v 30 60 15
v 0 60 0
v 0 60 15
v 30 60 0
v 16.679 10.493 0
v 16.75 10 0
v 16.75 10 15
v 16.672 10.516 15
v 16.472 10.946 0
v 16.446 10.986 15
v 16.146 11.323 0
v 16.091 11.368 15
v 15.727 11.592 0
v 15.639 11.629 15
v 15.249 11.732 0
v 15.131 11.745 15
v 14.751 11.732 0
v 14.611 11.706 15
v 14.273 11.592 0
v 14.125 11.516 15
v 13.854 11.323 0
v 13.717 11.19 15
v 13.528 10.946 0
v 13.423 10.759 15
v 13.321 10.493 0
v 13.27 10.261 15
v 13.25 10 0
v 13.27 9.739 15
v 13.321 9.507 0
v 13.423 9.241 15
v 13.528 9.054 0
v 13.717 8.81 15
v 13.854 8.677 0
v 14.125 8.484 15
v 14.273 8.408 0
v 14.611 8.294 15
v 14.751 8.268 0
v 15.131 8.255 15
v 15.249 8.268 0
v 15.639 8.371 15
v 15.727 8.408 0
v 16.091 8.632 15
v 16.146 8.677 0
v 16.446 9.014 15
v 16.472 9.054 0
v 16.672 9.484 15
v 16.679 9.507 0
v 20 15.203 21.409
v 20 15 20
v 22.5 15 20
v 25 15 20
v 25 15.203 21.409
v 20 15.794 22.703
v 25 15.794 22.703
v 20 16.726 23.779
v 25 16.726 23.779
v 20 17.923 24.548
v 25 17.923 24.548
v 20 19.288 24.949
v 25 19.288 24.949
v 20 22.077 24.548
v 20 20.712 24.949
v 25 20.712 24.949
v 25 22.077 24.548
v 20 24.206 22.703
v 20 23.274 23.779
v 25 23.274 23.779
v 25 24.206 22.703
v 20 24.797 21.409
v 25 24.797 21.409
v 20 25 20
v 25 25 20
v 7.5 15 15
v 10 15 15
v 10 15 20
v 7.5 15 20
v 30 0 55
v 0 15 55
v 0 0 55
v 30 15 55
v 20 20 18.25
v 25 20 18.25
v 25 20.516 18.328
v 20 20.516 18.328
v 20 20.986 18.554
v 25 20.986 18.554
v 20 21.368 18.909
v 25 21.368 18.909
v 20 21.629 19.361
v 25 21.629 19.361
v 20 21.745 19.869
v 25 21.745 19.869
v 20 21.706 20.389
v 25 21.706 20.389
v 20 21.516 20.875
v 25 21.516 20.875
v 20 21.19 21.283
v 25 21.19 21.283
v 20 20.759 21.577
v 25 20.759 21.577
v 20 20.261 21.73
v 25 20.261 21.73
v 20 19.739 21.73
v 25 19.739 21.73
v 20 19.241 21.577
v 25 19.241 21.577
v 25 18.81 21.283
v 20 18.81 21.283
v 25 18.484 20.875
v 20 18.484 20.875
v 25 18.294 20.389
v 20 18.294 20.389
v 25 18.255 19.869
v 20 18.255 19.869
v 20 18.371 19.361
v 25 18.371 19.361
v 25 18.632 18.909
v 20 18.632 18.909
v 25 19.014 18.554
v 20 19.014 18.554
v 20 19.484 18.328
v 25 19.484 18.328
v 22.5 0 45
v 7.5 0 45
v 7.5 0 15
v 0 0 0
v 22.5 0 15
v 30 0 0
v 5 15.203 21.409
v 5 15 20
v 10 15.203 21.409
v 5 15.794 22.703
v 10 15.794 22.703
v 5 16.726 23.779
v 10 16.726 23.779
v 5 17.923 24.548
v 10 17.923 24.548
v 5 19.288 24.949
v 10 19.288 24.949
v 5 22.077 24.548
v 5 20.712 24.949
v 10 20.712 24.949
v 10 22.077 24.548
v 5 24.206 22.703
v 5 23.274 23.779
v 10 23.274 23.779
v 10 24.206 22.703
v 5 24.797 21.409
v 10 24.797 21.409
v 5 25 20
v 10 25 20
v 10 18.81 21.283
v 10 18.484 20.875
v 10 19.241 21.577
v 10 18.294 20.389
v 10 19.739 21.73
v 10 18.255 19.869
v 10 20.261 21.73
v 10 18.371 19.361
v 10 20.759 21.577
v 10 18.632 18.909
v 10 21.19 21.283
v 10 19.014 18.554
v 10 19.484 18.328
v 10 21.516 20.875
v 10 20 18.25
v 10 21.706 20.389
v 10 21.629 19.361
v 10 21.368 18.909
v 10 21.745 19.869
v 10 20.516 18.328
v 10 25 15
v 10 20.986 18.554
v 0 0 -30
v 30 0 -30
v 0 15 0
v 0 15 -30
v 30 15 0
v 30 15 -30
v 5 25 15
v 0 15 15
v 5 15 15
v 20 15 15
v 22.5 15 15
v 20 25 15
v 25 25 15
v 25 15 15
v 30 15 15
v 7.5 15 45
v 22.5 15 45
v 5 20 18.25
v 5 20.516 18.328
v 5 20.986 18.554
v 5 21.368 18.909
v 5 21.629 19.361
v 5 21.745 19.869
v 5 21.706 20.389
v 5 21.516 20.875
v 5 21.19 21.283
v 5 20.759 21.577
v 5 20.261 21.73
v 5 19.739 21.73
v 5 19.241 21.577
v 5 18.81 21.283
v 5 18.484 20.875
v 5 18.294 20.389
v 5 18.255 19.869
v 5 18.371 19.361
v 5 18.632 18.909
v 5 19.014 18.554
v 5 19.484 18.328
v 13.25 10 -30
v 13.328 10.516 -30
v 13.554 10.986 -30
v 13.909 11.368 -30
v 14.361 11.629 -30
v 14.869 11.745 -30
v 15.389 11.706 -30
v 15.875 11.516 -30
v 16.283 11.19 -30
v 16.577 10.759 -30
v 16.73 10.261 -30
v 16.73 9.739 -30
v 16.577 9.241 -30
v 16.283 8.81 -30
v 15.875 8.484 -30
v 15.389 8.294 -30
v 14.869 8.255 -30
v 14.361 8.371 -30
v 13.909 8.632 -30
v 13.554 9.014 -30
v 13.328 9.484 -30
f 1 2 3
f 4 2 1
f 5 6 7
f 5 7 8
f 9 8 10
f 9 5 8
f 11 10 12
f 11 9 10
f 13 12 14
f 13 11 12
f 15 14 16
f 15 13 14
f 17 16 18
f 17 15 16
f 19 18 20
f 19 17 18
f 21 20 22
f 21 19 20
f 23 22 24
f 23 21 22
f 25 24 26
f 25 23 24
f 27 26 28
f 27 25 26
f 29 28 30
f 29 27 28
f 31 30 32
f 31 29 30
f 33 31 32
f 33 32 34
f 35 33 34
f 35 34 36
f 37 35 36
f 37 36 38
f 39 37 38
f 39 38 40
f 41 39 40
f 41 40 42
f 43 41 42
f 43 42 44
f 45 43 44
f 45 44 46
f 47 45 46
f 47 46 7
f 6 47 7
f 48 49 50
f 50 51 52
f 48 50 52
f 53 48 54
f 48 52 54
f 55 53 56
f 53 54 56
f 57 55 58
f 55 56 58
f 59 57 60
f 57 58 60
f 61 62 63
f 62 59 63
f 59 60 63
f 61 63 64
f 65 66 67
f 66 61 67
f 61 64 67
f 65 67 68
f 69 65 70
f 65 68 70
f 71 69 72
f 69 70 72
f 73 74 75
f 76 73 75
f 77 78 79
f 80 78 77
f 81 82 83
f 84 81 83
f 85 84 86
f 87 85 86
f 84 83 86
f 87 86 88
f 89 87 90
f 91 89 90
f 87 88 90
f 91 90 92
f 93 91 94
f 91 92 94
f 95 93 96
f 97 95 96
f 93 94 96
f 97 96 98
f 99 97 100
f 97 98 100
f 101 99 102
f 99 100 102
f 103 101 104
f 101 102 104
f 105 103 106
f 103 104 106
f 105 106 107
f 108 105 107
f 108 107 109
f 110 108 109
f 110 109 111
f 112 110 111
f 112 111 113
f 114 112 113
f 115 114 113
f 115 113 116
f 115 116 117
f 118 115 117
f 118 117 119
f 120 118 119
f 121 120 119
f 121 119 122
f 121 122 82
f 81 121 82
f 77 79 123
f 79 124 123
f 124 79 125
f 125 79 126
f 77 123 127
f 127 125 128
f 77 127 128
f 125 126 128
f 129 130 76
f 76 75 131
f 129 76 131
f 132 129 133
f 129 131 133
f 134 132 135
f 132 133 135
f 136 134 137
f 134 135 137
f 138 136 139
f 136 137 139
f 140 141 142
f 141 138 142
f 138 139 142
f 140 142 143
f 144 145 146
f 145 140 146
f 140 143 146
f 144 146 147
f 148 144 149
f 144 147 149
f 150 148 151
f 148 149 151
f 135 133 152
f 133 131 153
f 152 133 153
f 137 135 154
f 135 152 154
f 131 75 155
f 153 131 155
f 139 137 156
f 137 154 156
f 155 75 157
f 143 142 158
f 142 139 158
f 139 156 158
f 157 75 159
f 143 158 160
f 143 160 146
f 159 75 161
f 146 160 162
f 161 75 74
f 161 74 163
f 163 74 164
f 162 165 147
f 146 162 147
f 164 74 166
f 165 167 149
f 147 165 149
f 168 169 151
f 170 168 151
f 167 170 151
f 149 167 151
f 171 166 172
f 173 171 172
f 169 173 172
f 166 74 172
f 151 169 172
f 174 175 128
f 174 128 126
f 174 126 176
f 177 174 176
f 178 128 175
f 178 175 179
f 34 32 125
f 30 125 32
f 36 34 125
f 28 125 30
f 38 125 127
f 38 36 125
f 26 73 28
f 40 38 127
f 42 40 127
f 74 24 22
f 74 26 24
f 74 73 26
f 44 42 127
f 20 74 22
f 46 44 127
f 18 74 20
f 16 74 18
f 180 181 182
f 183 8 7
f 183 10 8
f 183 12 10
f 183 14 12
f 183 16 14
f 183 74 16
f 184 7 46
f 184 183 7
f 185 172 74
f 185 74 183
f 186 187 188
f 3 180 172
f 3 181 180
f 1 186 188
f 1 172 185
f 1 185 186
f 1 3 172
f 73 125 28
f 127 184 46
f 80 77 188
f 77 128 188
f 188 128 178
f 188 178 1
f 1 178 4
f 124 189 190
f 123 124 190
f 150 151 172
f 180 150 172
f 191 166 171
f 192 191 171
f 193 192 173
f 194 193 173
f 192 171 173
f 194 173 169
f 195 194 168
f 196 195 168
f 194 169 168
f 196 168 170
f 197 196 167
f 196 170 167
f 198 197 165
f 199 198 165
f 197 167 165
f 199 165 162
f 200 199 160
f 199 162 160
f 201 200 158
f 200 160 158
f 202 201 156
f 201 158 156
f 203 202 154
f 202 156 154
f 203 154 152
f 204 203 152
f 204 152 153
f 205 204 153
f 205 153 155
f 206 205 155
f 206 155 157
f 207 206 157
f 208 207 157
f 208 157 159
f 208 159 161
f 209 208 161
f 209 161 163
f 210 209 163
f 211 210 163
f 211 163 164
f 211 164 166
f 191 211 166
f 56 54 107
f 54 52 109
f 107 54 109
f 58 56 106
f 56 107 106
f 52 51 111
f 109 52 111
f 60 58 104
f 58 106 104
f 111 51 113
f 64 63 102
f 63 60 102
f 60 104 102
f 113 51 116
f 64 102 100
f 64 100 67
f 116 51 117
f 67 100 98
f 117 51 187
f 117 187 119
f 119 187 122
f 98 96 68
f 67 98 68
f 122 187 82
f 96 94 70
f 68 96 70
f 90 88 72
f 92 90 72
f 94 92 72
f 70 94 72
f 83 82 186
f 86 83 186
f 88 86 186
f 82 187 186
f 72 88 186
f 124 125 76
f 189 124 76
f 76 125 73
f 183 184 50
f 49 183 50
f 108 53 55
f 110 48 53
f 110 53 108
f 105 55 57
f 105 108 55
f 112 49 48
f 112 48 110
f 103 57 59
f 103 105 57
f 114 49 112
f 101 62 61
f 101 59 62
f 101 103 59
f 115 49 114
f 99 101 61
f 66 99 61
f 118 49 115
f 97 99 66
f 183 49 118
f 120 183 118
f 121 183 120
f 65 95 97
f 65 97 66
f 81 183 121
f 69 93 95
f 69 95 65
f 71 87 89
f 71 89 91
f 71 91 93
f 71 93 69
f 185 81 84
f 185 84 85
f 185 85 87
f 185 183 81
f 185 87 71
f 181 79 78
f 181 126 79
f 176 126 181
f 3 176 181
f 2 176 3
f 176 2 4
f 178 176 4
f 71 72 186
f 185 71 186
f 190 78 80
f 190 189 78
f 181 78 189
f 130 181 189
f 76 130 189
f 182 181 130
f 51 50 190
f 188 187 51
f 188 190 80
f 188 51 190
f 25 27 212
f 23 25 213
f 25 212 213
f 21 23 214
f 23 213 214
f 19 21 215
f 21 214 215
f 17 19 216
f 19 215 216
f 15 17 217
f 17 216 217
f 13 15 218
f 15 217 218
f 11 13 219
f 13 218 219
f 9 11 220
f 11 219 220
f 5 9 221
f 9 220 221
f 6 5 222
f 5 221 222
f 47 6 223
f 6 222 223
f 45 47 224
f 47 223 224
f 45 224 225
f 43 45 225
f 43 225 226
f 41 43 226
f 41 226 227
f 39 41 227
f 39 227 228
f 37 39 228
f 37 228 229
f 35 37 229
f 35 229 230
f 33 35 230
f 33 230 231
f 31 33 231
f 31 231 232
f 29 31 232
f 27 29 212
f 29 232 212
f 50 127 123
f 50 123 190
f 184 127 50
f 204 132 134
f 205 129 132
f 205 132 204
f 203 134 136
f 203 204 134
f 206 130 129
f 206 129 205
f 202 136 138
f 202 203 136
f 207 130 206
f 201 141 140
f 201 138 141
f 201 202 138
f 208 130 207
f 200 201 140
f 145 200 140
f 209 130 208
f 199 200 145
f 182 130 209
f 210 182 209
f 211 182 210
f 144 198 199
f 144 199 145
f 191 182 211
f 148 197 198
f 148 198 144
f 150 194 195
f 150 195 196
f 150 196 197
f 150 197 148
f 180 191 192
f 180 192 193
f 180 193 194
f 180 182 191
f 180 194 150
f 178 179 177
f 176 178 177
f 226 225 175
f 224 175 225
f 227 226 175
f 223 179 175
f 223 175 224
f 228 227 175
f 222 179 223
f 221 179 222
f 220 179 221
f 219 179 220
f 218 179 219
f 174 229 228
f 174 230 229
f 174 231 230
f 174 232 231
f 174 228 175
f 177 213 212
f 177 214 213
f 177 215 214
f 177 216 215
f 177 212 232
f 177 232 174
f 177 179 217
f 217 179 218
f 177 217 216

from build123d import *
from build123d.topology import SkipClean

# Parameters (mm, degrees)
SKETCH1_W           = 30
SKETCH1_H           = 60
SKETCH1_R           = 1.75
BOSS_EXTRUDE1_DEPTH = 15
SKETCH4_R           = 1.75
BOSS_EXTRUDE3_DEPTH = 30
SKETCH5_W           = 5
SKETCH5_H           = 10
SKETCH5_W_2         = 10
CUT_EXTRUDE1_DEPTH  = 69.738635424
SKETCH6_W           = 7.5
SKETCH6_H           = 15
BOSS_EXTRUDE4_DEPTH = 30
SKETCH7_W           = 30
SKETCH7_H           = 15
BOSS_EXTRUDE5_DEPTH = 10
BOSS_EXTRUDE6_START = 30
SKETCH8_W           = 30
SKETCH8_H           = 15
SKETCH8_R           = 1.75
BOSS_EXTRUDE6_DEPTH = 30


with BuildPart() as part:
    # Sketch1 → Boss-Extrude1 (new body)
    with BuildSketch(Plane.XY):
        with Locations((15, 30)):
            Rectangle(SKETCH1_W, SKETCH1_H)
        with Locations((15, 10)):
            Circle(SKETCH1_R, mode=Mode.SUBTRACT)
    extrude(amount=BOSS_EXTRUDE1_DEPTH)

    # Sketch4 → Boss-Extrude3 (add)
    with BuildSketch(Plane(origin=(30, 0, 0), x_dir=(0, 0, -1), z_dir=(1, 0, 0))):
        with BuildLine():
            Line((-15, 15), (-20, 15))
            ThreePointArc((-20, 15), (-25, 20), (-20, 25))
            Line((-20, 25), (-15, 25))
            Line((-15, 25), (-15, 15))
        make_face()
        with Locations((-20, 20)):
            Circle(SKETCH4_R, mode=Mode.SUBTRACT)
    extrude(amount=-BOSS_EXTRUDE3_DEPTH)

    # Sketch5 → Cut-Extrude1 (cut, through all)
    with BuildSketch(Plane.XY.offset(15)):
        with Locations((2.5, 20)):
            Rectangle(SKETCH5_W, SKETCH5_H)
        with Locations((15, 20)):
            Rectangle(SKETCH5_W_2, SKETCH5_H)
        with Locations((27.5, 20)):
            Rectangle(SKETCH5_W, SKETCH5_H)
    extrude(amount=CUT_EXTRUDE1_DEPTH, mode=Mode.SUBTRACT)

    # Sketch6 → Boss-Extrude4 (add)
    with BuildSketch(Plane.XY.offset(15)):
        with Locations((3.75, 7.5)):
            Rectangle(SKETCH6_W, SKETCH6_H)
        with Locations((26.25, 7.5)):
            Rectangle(SKETCH6_W, SKETCH6_H)
    extrude(amount=BOSS_EXTRUDE4_DEPTH)

    # Sketch7 → Boss-Extrude5 (add)
    with BuildSketch(Plane.XY.offset(45)):
        with Locations((15, 7.5)):
            Rectangle(SKETCH7_W, SKETCH7_H)
    extrude(amount=BOSS_EXTRUDE5_DEPTH)

    # Sketch8 → Boss-Extrude6 (add)
    with SkipClean():  # the faces are left unmerged after this step: merging them gives an invalid solid
        with BuildSketch(Plane(origin=(0, 0, 0), x_dir=(-1, 0, 0), z_dir=(0, 0, -1)).offset(BOSS_EXTRUDE6_START)):
            with Locations((-15, 7.5)):
                Rectangle(SKETCH8_W, SKETCH8_H)
            with Locations((-15, 10)):
                Circle(SKETCH8_R, mode=Mode.SUBTRACT)
        extrude(amount=-BOSS_EXTRUDE6_DEPTH)


solid = part.part
